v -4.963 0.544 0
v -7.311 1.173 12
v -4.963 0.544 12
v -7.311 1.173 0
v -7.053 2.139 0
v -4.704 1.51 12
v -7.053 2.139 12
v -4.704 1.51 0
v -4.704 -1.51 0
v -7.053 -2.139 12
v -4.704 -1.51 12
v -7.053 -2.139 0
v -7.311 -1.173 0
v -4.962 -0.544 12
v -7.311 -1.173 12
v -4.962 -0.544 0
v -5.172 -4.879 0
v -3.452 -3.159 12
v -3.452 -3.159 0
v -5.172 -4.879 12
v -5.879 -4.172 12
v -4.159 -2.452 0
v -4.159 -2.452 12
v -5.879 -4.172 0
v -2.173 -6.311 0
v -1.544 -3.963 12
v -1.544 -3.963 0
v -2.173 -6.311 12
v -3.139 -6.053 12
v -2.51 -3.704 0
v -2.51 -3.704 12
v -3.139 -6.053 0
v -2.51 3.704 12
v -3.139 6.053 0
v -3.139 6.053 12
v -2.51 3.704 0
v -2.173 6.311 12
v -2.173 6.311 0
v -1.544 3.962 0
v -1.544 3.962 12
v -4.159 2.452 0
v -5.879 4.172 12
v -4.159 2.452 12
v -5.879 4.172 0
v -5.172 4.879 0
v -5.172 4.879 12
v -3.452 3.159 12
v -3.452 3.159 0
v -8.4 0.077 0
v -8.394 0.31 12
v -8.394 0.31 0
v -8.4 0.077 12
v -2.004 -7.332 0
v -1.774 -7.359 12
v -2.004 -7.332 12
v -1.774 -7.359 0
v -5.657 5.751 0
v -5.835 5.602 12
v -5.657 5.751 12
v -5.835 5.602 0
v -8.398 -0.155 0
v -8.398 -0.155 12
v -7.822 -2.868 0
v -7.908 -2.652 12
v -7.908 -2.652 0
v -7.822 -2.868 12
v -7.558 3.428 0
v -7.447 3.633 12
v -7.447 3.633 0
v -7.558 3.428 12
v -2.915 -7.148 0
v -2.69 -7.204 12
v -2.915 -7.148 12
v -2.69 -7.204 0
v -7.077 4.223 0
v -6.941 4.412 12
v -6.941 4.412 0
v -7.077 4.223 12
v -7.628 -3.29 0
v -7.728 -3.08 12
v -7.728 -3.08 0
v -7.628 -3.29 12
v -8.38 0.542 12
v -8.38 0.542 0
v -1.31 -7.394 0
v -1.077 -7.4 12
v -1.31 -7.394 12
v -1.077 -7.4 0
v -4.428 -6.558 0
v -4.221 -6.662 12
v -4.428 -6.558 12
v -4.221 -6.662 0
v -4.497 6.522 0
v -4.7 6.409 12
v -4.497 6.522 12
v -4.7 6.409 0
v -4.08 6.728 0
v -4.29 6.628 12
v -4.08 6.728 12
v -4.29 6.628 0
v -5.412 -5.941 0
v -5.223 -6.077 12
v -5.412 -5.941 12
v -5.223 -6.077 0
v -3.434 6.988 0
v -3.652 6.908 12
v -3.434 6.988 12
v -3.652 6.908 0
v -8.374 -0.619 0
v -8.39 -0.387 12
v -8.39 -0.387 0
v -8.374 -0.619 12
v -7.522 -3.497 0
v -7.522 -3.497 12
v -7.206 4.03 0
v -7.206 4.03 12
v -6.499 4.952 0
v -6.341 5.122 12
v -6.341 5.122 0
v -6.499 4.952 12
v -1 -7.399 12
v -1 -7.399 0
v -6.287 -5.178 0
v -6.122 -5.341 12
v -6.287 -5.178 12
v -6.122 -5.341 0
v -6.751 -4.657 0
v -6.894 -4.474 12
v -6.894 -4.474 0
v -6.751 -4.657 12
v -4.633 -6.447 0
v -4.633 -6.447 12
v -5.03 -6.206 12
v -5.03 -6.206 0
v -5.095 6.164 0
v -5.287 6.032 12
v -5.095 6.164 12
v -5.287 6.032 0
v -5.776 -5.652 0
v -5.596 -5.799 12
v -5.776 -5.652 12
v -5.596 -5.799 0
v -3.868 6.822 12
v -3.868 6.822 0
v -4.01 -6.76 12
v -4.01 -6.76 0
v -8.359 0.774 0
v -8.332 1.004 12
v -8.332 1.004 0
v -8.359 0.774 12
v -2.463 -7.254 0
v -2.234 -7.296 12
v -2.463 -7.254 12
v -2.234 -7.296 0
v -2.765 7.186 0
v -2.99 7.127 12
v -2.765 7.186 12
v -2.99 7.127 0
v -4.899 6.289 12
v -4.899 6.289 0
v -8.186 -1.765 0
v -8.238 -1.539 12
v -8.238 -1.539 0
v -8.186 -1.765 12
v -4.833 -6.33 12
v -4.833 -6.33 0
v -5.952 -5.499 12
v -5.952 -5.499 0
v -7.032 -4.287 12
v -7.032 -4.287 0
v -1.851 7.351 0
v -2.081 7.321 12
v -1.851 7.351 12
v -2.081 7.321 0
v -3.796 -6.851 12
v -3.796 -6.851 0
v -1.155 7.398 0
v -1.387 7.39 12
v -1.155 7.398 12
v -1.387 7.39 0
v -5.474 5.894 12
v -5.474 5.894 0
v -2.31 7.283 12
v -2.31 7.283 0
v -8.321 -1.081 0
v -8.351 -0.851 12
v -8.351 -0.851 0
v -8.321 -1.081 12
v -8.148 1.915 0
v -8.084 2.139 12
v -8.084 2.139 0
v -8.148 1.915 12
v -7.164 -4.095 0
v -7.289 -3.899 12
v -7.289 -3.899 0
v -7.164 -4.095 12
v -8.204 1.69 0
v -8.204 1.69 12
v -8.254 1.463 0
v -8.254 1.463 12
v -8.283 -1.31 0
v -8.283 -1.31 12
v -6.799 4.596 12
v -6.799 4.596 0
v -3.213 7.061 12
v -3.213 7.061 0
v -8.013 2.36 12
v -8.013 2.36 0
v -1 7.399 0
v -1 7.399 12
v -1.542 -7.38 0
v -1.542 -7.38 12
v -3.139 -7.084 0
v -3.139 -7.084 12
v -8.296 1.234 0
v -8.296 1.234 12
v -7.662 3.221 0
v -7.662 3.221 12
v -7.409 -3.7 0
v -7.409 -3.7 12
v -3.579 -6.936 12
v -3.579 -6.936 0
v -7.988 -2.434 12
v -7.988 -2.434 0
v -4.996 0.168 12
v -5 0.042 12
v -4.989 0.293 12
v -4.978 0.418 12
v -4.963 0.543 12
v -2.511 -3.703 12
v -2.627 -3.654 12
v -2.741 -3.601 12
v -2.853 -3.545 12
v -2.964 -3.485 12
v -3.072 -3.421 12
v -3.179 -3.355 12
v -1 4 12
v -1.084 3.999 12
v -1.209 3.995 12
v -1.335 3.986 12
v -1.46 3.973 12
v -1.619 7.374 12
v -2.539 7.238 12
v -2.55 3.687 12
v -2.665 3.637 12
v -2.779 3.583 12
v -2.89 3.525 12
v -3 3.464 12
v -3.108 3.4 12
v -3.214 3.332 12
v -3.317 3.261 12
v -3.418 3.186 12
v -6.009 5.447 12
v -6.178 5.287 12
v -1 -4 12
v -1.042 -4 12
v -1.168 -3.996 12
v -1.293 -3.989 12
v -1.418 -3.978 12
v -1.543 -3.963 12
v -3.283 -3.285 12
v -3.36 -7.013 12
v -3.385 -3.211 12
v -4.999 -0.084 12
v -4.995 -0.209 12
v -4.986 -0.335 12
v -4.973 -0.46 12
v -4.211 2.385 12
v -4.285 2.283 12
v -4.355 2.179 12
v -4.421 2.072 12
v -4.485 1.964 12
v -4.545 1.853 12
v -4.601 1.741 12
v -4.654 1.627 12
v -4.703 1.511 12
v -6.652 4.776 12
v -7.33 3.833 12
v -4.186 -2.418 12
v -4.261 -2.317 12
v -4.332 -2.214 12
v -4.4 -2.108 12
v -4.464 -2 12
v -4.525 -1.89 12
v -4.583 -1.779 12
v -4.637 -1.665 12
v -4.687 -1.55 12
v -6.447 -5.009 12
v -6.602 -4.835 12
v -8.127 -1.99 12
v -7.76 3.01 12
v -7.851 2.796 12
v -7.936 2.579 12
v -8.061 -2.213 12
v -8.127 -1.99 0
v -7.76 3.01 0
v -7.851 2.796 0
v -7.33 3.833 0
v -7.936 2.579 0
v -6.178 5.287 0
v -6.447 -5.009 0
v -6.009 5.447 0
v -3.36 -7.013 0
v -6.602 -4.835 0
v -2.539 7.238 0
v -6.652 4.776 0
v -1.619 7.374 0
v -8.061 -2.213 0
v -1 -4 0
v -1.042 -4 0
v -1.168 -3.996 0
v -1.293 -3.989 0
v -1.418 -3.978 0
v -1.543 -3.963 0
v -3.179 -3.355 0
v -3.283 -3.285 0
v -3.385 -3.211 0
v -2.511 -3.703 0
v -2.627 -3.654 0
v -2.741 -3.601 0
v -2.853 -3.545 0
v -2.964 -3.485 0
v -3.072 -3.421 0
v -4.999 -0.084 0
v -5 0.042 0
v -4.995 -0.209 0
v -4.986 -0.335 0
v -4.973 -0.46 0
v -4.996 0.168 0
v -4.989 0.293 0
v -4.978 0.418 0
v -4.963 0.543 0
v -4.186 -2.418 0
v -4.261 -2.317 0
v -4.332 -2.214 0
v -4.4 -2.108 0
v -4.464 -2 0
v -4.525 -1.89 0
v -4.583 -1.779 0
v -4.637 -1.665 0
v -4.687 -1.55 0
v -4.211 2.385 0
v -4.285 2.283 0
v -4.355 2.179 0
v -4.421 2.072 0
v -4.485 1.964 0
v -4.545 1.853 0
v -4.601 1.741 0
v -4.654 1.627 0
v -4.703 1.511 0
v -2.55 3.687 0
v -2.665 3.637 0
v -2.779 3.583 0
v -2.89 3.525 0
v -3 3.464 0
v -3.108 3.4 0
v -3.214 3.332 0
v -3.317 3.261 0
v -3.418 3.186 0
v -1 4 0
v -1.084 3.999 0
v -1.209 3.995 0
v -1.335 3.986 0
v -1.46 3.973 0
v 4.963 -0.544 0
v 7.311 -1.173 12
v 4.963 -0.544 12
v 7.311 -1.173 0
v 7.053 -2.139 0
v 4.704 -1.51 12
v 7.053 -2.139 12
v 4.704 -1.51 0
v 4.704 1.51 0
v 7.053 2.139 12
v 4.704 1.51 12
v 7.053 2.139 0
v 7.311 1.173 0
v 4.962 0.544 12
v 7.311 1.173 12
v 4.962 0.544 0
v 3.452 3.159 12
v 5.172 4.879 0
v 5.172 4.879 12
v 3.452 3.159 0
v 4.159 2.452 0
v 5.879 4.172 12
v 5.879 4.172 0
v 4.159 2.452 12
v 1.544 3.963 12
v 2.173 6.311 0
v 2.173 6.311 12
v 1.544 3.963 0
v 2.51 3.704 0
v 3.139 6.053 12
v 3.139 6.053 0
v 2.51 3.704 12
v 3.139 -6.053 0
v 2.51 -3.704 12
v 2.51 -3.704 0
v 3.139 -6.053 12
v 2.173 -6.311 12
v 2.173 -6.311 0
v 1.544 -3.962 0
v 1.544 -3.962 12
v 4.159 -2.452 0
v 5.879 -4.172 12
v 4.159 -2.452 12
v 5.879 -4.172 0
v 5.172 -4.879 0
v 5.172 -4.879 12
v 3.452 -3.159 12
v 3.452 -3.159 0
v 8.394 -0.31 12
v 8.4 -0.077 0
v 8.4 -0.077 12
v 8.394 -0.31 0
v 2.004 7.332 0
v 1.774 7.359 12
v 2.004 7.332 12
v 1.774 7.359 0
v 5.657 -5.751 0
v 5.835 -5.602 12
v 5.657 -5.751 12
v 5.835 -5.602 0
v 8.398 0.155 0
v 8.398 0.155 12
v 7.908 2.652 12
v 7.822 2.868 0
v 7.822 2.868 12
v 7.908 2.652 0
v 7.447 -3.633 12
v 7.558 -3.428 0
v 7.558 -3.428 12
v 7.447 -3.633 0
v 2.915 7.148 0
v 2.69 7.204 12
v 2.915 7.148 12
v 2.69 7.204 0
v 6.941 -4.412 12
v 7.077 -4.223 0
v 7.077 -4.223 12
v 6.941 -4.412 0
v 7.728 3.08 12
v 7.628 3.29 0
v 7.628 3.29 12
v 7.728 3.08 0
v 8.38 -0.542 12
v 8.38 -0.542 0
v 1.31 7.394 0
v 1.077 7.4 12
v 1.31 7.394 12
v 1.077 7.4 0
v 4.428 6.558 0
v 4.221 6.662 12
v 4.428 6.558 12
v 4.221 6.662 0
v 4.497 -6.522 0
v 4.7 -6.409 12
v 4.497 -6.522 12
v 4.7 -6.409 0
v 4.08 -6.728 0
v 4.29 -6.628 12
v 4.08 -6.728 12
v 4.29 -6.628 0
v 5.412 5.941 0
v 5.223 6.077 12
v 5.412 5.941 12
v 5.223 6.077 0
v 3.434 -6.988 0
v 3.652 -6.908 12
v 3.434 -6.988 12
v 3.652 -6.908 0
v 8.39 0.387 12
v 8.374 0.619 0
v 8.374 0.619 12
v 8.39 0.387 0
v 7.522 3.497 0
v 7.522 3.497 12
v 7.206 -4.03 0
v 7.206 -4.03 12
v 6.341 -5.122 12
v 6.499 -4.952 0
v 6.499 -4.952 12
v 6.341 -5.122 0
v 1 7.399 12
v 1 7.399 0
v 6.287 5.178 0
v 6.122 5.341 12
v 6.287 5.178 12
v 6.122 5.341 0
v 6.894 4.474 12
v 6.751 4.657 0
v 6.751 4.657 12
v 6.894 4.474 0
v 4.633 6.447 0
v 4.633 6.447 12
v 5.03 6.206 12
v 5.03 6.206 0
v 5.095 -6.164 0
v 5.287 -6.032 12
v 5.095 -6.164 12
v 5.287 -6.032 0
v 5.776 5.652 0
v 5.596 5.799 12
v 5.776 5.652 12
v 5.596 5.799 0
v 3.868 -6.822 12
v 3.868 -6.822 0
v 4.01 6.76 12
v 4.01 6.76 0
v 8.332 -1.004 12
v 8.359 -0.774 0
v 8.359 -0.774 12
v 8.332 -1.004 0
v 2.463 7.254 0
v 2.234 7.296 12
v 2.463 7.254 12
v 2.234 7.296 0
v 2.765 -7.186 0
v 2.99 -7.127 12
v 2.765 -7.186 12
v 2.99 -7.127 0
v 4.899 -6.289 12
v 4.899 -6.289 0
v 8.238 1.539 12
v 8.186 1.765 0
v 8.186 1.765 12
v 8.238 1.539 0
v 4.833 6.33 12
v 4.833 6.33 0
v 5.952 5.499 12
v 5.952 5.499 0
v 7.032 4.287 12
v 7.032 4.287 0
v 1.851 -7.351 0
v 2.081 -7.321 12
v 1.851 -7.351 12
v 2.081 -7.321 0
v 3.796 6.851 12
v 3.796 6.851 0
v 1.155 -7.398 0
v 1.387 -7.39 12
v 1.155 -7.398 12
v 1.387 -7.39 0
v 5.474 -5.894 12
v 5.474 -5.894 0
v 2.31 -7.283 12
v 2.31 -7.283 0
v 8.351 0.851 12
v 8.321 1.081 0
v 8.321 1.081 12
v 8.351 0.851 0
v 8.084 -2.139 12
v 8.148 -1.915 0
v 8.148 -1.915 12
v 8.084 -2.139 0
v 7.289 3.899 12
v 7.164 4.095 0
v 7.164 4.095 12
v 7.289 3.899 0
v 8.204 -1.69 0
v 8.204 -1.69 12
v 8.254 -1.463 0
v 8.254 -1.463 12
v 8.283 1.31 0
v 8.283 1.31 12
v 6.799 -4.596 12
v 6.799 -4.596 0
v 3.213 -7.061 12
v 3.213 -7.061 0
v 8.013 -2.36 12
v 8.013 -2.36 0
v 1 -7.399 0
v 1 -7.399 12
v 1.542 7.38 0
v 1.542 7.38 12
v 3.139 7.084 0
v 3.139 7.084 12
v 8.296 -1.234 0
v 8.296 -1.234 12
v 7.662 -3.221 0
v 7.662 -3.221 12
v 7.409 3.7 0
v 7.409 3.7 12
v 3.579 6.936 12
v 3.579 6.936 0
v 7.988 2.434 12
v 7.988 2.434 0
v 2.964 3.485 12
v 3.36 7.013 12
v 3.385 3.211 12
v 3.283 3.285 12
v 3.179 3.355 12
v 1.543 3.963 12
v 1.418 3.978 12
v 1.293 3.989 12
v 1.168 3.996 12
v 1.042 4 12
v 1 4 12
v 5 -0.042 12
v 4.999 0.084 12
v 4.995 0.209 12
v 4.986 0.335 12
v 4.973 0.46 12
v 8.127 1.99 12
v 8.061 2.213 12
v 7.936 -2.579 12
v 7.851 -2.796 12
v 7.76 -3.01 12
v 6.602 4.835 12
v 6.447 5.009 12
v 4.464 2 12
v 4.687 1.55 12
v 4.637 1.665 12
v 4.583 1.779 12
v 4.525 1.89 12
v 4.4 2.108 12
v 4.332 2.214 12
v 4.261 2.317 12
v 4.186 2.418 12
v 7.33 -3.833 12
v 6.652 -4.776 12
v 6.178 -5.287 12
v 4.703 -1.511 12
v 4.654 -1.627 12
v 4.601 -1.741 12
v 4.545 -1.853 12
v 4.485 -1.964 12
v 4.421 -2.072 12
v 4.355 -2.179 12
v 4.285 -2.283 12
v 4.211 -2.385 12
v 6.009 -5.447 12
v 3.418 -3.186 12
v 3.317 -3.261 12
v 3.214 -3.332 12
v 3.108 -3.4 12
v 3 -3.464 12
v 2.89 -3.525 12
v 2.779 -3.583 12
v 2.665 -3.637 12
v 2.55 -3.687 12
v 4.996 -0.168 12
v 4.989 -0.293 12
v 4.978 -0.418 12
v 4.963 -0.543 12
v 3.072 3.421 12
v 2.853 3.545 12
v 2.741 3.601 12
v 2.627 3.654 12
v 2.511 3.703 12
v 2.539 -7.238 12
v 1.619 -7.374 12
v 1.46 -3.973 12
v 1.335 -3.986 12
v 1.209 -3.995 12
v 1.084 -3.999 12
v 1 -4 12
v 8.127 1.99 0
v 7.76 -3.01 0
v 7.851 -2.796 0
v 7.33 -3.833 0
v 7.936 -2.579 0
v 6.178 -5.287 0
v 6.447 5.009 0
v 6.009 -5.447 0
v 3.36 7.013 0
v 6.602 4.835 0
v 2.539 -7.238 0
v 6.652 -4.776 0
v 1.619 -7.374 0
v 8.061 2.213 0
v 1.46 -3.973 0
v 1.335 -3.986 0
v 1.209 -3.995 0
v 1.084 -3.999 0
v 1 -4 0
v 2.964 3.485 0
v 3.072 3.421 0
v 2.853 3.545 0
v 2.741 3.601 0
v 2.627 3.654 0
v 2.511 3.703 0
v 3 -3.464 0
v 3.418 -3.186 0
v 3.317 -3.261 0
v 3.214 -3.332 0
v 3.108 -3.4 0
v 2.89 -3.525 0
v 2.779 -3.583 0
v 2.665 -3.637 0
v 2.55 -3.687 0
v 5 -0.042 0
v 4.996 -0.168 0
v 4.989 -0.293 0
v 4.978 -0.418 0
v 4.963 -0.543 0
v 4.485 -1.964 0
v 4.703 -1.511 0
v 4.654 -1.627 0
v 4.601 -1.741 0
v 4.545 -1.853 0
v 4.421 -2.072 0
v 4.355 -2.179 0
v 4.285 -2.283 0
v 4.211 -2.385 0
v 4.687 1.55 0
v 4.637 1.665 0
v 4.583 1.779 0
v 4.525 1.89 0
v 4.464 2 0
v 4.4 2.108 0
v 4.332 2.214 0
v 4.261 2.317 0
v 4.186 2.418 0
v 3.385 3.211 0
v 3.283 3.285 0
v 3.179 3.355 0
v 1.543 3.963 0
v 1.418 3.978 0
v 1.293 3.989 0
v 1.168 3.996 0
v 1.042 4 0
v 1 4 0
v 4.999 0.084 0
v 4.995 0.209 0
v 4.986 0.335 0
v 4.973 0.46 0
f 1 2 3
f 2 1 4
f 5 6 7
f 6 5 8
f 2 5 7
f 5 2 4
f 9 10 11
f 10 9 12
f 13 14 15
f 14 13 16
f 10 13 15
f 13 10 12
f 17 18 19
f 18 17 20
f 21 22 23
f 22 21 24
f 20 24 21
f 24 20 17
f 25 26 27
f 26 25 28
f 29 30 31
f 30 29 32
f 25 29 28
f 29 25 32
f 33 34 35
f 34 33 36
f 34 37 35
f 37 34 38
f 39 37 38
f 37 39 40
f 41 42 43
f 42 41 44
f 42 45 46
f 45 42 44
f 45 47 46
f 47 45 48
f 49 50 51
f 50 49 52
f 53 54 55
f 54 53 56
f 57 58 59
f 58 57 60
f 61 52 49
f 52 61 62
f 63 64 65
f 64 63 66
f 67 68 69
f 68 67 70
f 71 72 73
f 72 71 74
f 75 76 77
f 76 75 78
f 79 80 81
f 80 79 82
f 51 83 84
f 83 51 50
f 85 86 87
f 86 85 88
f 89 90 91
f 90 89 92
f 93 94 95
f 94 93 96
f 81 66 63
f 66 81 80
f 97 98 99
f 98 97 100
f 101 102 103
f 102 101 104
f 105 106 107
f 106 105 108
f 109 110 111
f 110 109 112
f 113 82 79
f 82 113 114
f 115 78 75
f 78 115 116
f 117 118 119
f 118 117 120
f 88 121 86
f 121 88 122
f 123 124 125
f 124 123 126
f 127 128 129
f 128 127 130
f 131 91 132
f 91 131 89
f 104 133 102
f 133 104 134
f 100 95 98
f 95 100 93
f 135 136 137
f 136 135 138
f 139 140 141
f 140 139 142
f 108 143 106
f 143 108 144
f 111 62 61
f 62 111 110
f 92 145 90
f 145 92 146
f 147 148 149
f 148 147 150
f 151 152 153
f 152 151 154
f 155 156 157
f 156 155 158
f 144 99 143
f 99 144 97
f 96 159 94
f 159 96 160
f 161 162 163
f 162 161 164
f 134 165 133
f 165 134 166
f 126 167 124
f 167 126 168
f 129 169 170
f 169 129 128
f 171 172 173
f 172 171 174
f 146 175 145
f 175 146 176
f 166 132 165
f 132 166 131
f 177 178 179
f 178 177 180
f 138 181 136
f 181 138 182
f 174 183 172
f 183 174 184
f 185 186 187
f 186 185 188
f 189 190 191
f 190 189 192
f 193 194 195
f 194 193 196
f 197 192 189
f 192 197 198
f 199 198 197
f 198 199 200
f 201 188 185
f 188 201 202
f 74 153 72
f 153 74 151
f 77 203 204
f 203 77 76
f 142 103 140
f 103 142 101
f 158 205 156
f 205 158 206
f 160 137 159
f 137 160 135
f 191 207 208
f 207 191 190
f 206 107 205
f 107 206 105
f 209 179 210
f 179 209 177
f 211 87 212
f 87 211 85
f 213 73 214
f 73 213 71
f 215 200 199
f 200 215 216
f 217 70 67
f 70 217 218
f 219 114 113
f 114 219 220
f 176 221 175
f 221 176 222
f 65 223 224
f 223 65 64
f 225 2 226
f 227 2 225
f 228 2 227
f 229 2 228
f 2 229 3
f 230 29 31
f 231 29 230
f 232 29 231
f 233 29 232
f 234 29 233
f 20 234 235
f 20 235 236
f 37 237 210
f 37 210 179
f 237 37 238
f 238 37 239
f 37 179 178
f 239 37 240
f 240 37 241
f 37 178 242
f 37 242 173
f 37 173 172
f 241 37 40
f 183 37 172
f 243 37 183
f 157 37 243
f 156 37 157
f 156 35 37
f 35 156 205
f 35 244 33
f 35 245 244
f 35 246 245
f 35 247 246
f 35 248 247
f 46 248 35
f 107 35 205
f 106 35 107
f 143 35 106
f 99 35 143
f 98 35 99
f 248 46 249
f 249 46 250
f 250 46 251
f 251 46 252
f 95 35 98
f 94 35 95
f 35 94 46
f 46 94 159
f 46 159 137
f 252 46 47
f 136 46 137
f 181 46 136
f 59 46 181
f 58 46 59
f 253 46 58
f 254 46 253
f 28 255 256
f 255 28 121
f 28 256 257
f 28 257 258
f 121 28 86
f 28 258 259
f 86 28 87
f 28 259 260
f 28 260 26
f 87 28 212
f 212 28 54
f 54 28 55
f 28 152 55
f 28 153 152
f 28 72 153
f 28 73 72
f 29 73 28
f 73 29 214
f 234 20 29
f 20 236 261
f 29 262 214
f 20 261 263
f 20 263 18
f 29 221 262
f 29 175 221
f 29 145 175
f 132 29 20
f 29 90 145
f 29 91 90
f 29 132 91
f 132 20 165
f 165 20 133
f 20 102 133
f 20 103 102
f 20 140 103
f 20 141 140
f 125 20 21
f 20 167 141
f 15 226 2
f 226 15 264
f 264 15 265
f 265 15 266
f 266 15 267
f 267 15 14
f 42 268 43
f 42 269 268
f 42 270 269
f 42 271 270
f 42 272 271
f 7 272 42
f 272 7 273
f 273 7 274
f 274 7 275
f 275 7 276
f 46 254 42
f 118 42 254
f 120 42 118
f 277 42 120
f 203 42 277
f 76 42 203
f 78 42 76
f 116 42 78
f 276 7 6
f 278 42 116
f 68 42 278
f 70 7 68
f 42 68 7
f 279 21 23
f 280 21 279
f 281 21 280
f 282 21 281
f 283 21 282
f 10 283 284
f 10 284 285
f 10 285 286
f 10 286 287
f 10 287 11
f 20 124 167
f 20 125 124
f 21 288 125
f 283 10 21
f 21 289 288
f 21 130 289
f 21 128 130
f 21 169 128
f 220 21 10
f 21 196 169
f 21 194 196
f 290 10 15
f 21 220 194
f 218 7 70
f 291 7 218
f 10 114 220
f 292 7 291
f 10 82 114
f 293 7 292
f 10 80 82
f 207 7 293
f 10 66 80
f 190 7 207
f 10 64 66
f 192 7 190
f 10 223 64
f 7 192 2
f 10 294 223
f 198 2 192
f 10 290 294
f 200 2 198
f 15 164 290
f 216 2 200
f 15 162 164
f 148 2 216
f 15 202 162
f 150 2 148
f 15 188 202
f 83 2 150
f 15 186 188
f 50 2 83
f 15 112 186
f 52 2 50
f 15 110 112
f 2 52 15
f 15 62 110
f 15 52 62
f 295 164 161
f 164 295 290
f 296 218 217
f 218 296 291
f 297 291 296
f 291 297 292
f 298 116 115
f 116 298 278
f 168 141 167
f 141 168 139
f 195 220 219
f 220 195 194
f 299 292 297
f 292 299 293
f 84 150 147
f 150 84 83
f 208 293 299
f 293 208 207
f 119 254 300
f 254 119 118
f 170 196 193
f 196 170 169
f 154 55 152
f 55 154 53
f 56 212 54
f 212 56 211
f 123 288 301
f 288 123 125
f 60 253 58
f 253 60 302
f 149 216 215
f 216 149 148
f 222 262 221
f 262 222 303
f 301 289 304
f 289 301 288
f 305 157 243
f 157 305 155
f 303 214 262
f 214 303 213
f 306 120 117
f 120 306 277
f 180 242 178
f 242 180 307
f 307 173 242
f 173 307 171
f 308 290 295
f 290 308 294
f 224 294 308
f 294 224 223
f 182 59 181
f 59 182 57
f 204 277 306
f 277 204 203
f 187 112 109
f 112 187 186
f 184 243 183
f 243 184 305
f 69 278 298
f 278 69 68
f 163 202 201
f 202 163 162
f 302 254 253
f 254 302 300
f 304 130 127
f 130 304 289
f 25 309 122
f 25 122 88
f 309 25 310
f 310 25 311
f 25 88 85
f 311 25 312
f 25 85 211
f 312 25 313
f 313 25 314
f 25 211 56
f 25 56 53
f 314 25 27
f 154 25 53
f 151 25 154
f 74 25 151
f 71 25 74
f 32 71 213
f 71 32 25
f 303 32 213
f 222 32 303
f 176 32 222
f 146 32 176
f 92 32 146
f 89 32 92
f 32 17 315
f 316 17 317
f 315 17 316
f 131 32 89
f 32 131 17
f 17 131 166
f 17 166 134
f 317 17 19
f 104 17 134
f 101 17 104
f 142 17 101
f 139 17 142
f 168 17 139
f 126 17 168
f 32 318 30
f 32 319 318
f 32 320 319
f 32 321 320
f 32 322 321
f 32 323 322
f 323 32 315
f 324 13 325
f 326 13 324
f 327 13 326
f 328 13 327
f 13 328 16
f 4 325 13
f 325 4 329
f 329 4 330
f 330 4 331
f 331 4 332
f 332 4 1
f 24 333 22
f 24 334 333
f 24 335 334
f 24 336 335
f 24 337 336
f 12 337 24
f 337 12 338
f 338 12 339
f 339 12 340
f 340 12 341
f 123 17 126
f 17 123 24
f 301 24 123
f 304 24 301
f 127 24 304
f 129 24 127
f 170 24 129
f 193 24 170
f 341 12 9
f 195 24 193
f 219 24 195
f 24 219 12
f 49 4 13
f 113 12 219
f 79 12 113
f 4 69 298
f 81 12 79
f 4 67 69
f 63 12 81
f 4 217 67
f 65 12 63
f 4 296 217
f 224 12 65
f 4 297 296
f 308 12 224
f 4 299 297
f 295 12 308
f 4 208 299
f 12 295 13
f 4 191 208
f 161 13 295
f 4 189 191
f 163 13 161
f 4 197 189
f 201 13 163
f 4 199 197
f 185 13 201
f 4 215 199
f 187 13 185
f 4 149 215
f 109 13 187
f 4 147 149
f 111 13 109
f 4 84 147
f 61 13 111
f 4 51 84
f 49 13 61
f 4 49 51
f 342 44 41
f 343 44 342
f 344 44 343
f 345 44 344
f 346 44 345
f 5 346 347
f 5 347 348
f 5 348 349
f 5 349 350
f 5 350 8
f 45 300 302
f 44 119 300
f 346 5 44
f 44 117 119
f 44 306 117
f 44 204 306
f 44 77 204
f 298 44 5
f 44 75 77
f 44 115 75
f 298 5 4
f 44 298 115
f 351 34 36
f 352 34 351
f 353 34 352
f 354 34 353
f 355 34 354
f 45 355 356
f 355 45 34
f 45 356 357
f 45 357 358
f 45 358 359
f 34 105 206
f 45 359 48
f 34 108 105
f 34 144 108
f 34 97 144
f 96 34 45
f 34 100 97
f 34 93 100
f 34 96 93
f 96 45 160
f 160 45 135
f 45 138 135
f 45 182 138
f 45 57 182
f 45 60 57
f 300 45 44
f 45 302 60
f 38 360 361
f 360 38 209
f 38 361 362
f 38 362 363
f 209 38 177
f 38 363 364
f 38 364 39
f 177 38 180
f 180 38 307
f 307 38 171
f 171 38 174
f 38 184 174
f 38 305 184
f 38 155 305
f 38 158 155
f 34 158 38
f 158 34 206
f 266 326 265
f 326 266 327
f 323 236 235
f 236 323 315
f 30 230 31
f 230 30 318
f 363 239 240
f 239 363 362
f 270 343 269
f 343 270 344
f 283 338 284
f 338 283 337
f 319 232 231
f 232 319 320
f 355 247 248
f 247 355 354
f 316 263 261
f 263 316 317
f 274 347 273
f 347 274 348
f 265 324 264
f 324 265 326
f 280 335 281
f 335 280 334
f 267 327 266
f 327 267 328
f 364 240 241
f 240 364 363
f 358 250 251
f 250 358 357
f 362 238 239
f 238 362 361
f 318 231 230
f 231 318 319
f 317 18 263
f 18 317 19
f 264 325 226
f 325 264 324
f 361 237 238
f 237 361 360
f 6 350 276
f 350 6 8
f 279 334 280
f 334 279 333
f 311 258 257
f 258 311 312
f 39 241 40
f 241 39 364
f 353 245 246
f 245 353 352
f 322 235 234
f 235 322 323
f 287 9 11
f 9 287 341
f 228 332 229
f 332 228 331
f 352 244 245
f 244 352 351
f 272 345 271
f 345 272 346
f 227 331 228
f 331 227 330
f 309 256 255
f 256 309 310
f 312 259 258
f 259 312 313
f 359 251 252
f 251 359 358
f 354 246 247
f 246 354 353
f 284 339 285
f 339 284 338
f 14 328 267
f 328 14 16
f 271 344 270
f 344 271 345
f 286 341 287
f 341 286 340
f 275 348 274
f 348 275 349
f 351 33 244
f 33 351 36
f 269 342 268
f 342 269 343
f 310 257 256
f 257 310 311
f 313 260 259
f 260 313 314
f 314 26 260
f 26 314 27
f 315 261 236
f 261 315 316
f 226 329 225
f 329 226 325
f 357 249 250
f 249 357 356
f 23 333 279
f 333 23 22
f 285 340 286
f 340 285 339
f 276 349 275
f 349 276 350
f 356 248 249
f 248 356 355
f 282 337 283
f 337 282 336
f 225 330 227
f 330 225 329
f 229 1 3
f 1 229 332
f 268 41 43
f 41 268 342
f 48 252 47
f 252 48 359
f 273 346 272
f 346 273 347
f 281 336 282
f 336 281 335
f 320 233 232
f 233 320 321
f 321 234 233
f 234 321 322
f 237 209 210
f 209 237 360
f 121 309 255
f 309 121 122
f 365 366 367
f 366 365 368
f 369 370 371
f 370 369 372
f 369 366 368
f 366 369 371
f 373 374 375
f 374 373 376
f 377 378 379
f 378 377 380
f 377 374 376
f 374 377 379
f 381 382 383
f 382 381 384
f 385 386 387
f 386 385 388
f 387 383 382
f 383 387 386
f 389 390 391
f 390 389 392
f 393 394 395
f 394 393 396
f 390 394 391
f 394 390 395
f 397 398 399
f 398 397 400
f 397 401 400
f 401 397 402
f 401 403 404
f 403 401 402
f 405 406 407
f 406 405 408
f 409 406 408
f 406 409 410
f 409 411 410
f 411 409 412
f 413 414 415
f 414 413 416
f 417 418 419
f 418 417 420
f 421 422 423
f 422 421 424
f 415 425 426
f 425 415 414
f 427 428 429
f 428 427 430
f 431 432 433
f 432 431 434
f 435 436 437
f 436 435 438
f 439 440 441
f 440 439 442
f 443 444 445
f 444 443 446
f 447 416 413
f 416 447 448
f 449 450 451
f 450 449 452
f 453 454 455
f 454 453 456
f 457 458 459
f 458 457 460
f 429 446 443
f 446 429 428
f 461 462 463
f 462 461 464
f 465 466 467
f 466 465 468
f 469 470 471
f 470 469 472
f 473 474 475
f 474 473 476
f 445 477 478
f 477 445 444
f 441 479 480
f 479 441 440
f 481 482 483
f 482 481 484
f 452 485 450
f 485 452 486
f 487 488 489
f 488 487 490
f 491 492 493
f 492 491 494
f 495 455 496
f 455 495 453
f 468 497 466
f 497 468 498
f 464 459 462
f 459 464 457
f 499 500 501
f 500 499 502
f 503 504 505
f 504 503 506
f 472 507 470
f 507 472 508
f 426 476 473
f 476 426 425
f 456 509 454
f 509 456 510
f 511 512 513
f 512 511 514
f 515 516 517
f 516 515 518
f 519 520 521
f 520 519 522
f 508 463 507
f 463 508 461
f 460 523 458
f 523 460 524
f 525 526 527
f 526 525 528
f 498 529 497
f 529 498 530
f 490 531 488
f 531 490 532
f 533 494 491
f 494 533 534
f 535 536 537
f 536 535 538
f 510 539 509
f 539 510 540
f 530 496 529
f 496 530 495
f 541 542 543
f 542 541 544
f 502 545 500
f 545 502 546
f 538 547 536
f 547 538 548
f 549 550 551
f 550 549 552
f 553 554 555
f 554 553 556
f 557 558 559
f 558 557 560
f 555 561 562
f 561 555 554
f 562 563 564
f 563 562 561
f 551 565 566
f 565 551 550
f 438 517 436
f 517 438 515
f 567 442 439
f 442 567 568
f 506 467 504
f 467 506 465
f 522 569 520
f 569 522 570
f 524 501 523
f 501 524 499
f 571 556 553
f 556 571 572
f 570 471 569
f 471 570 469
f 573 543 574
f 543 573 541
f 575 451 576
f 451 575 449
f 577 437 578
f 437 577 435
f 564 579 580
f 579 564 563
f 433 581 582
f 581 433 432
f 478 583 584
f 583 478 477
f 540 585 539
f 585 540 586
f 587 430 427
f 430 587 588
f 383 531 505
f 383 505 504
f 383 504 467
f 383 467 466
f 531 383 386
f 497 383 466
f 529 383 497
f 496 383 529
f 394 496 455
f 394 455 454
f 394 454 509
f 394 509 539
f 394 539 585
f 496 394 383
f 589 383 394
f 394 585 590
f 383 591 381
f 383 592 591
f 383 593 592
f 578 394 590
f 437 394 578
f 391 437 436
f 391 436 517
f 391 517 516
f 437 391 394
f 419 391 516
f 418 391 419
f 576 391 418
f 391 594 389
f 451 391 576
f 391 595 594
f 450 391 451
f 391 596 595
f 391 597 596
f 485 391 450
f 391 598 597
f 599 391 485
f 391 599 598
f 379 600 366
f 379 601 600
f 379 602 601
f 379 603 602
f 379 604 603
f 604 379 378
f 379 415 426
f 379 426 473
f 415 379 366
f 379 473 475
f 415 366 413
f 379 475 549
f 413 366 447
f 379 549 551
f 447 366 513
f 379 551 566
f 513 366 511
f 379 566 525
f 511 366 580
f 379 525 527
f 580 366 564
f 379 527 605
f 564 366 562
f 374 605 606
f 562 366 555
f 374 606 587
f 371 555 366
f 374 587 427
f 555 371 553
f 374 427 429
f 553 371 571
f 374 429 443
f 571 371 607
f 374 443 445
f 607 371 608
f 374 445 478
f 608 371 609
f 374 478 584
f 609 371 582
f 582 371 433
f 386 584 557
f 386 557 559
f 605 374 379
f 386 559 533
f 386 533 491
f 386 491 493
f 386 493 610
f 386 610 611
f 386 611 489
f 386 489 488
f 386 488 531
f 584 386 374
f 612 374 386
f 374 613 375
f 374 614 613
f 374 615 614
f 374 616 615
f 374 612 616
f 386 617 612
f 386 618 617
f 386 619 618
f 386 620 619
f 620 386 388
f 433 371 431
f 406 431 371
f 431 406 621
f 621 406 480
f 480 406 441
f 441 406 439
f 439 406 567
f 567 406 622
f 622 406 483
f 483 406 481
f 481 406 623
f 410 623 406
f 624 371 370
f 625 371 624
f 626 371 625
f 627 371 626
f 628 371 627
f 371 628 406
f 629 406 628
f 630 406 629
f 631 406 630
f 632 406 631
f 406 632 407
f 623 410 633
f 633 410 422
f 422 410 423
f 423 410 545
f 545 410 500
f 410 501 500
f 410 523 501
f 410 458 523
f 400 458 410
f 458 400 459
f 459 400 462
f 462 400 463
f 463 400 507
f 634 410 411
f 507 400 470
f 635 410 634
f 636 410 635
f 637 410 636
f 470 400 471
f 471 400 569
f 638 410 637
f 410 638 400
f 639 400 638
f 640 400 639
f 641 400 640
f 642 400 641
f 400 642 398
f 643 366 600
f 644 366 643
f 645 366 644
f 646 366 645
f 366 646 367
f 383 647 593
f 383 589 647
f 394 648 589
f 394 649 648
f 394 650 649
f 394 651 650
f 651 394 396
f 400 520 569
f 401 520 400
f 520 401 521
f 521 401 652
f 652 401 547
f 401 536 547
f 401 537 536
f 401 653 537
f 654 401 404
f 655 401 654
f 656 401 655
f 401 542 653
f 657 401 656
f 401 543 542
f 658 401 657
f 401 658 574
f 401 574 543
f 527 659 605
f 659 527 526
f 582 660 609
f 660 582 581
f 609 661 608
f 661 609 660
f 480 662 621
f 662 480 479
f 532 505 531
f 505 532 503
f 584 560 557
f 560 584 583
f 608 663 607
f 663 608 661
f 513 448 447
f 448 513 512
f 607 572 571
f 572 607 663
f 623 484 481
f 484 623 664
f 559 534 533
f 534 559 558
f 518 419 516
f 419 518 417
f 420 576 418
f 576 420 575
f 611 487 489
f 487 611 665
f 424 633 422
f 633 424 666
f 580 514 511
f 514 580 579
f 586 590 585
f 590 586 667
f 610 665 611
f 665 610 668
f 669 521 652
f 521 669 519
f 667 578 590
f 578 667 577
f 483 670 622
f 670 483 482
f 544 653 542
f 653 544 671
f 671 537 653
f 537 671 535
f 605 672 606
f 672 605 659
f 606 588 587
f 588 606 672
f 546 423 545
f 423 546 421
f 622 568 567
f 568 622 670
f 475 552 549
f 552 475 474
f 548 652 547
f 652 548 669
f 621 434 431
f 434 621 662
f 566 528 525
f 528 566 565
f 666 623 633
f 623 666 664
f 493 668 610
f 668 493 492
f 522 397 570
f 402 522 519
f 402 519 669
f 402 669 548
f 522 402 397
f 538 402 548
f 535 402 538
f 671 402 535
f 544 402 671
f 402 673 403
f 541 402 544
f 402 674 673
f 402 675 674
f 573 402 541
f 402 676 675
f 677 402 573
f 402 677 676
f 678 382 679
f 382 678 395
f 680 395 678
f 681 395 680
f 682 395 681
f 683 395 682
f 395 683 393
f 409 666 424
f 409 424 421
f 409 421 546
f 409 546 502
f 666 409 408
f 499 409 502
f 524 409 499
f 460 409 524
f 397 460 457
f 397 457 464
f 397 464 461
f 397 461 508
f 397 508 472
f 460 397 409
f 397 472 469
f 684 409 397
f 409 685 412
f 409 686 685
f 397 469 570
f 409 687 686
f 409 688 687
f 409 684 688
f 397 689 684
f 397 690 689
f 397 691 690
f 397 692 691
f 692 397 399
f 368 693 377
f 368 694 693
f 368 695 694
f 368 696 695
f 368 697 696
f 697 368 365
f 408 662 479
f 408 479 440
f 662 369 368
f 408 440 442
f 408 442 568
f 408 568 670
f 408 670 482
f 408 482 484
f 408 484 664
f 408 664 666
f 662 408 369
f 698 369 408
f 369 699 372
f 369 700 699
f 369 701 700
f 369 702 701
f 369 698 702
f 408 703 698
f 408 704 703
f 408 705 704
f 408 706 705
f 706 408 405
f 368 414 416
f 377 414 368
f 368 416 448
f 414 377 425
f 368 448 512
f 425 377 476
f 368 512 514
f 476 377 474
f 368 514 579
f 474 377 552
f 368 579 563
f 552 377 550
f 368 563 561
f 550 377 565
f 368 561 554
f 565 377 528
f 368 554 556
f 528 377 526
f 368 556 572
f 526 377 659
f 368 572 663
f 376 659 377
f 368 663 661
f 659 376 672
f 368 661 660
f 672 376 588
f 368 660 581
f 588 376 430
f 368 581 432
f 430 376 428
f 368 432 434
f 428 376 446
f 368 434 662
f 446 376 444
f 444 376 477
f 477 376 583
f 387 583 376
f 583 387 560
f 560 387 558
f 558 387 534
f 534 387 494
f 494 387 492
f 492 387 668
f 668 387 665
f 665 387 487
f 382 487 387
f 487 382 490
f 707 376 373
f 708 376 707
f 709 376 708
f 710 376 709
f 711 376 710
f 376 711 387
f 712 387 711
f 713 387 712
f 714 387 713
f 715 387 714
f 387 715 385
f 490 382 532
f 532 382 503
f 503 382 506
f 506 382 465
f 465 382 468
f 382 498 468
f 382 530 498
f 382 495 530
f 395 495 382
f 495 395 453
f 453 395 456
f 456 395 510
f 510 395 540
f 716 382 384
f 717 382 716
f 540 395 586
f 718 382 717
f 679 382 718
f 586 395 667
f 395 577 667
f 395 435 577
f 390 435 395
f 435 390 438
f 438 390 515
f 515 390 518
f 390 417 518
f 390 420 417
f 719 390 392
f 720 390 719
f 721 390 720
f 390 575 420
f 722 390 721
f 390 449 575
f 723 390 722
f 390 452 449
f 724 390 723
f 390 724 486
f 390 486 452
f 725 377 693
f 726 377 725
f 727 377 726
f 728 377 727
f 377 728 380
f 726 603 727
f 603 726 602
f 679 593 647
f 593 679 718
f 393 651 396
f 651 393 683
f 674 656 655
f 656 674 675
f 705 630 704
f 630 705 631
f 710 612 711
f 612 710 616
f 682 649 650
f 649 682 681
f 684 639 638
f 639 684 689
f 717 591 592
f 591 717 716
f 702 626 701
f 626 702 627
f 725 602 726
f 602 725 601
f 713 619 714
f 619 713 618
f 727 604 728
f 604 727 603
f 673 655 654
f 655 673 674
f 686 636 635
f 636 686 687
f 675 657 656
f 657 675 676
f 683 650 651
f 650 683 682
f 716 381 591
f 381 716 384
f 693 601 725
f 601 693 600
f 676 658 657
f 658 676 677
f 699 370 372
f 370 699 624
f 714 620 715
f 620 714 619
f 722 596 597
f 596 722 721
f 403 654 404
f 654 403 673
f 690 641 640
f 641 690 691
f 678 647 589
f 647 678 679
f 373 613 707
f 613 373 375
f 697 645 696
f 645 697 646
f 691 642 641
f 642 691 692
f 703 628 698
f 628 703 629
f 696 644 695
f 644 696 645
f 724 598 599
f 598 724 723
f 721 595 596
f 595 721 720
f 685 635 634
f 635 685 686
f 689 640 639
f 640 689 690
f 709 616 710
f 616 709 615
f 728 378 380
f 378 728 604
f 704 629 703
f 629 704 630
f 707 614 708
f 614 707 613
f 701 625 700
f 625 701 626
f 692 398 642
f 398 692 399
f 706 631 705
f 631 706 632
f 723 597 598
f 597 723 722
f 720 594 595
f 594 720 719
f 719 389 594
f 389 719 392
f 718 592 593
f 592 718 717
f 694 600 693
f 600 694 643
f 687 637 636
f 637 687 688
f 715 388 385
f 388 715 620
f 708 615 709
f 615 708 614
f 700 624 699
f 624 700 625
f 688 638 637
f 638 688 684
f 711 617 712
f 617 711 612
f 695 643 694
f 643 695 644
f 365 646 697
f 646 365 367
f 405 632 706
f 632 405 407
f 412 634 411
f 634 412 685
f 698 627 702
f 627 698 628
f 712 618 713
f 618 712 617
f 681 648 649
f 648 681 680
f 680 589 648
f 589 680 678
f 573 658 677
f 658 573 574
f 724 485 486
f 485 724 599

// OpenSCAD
// [FL_INDEX: keywords="openscad, 3d_parametric, Parametric_Linear_Bearing_with_Optional_Split, csg_solid" | COT="Parametric OpenSCAD design from 3DCodeverse"]
// Title: Parametric Linear Bearing with Optional Split

/* [Linear Bearing] */

// Outer Diameter (mm)
outer_diameter = 14.8;
outer_radius = outer_diameter / 2;

// Inner Diameter (mm)
inner_diameter = 8;
inner_radius = inner_diameter / 2;

// Sidewall Thickness (mm)
sidewall_thickness = 2;

// Height (mm)
height = 12; 

// Split Bearing?
split_bearing = "Yes";  // [Yes,No]

/* [Hidden] */
resolution = 200;
fudge = .1;

module half_bearing() {
	rotate([0,0,-15]) 
	difference() {
		cylinder(r = outer_radius, h = height, $fn = resolution);
	
		translate([0,0,-fudge])
		cylinder(r = inner_radius, h = height + fudge * 2, $fn = resolution);
		
		for (r = [-90, -60, -30, 0, 30, 60, 90]) 
			rotate([0,0,r]) 
			translate([0,0,height/2 - fudge]) 
			cube([inner_radius/4,outer_radius * 2 - sidewall_thickness,height + fudge * 4], center = true);
	
		rotate([0,0,15]) 
		translate([0,-outer_radius * 1.1,-fudge]) 
		cube([outer_radius,outer_radius * 2.2,height + fudge * 4]);
	}
}

if (split_bearing == "Yes") {
	translate([-1,0,0])
	half_bearing();
	translate([1,0,0])
	rotate([0,0,180])
	half_bearing();
} else {
	half_bearing();
	rotate([0,0,180])
	half_bearing();
}
